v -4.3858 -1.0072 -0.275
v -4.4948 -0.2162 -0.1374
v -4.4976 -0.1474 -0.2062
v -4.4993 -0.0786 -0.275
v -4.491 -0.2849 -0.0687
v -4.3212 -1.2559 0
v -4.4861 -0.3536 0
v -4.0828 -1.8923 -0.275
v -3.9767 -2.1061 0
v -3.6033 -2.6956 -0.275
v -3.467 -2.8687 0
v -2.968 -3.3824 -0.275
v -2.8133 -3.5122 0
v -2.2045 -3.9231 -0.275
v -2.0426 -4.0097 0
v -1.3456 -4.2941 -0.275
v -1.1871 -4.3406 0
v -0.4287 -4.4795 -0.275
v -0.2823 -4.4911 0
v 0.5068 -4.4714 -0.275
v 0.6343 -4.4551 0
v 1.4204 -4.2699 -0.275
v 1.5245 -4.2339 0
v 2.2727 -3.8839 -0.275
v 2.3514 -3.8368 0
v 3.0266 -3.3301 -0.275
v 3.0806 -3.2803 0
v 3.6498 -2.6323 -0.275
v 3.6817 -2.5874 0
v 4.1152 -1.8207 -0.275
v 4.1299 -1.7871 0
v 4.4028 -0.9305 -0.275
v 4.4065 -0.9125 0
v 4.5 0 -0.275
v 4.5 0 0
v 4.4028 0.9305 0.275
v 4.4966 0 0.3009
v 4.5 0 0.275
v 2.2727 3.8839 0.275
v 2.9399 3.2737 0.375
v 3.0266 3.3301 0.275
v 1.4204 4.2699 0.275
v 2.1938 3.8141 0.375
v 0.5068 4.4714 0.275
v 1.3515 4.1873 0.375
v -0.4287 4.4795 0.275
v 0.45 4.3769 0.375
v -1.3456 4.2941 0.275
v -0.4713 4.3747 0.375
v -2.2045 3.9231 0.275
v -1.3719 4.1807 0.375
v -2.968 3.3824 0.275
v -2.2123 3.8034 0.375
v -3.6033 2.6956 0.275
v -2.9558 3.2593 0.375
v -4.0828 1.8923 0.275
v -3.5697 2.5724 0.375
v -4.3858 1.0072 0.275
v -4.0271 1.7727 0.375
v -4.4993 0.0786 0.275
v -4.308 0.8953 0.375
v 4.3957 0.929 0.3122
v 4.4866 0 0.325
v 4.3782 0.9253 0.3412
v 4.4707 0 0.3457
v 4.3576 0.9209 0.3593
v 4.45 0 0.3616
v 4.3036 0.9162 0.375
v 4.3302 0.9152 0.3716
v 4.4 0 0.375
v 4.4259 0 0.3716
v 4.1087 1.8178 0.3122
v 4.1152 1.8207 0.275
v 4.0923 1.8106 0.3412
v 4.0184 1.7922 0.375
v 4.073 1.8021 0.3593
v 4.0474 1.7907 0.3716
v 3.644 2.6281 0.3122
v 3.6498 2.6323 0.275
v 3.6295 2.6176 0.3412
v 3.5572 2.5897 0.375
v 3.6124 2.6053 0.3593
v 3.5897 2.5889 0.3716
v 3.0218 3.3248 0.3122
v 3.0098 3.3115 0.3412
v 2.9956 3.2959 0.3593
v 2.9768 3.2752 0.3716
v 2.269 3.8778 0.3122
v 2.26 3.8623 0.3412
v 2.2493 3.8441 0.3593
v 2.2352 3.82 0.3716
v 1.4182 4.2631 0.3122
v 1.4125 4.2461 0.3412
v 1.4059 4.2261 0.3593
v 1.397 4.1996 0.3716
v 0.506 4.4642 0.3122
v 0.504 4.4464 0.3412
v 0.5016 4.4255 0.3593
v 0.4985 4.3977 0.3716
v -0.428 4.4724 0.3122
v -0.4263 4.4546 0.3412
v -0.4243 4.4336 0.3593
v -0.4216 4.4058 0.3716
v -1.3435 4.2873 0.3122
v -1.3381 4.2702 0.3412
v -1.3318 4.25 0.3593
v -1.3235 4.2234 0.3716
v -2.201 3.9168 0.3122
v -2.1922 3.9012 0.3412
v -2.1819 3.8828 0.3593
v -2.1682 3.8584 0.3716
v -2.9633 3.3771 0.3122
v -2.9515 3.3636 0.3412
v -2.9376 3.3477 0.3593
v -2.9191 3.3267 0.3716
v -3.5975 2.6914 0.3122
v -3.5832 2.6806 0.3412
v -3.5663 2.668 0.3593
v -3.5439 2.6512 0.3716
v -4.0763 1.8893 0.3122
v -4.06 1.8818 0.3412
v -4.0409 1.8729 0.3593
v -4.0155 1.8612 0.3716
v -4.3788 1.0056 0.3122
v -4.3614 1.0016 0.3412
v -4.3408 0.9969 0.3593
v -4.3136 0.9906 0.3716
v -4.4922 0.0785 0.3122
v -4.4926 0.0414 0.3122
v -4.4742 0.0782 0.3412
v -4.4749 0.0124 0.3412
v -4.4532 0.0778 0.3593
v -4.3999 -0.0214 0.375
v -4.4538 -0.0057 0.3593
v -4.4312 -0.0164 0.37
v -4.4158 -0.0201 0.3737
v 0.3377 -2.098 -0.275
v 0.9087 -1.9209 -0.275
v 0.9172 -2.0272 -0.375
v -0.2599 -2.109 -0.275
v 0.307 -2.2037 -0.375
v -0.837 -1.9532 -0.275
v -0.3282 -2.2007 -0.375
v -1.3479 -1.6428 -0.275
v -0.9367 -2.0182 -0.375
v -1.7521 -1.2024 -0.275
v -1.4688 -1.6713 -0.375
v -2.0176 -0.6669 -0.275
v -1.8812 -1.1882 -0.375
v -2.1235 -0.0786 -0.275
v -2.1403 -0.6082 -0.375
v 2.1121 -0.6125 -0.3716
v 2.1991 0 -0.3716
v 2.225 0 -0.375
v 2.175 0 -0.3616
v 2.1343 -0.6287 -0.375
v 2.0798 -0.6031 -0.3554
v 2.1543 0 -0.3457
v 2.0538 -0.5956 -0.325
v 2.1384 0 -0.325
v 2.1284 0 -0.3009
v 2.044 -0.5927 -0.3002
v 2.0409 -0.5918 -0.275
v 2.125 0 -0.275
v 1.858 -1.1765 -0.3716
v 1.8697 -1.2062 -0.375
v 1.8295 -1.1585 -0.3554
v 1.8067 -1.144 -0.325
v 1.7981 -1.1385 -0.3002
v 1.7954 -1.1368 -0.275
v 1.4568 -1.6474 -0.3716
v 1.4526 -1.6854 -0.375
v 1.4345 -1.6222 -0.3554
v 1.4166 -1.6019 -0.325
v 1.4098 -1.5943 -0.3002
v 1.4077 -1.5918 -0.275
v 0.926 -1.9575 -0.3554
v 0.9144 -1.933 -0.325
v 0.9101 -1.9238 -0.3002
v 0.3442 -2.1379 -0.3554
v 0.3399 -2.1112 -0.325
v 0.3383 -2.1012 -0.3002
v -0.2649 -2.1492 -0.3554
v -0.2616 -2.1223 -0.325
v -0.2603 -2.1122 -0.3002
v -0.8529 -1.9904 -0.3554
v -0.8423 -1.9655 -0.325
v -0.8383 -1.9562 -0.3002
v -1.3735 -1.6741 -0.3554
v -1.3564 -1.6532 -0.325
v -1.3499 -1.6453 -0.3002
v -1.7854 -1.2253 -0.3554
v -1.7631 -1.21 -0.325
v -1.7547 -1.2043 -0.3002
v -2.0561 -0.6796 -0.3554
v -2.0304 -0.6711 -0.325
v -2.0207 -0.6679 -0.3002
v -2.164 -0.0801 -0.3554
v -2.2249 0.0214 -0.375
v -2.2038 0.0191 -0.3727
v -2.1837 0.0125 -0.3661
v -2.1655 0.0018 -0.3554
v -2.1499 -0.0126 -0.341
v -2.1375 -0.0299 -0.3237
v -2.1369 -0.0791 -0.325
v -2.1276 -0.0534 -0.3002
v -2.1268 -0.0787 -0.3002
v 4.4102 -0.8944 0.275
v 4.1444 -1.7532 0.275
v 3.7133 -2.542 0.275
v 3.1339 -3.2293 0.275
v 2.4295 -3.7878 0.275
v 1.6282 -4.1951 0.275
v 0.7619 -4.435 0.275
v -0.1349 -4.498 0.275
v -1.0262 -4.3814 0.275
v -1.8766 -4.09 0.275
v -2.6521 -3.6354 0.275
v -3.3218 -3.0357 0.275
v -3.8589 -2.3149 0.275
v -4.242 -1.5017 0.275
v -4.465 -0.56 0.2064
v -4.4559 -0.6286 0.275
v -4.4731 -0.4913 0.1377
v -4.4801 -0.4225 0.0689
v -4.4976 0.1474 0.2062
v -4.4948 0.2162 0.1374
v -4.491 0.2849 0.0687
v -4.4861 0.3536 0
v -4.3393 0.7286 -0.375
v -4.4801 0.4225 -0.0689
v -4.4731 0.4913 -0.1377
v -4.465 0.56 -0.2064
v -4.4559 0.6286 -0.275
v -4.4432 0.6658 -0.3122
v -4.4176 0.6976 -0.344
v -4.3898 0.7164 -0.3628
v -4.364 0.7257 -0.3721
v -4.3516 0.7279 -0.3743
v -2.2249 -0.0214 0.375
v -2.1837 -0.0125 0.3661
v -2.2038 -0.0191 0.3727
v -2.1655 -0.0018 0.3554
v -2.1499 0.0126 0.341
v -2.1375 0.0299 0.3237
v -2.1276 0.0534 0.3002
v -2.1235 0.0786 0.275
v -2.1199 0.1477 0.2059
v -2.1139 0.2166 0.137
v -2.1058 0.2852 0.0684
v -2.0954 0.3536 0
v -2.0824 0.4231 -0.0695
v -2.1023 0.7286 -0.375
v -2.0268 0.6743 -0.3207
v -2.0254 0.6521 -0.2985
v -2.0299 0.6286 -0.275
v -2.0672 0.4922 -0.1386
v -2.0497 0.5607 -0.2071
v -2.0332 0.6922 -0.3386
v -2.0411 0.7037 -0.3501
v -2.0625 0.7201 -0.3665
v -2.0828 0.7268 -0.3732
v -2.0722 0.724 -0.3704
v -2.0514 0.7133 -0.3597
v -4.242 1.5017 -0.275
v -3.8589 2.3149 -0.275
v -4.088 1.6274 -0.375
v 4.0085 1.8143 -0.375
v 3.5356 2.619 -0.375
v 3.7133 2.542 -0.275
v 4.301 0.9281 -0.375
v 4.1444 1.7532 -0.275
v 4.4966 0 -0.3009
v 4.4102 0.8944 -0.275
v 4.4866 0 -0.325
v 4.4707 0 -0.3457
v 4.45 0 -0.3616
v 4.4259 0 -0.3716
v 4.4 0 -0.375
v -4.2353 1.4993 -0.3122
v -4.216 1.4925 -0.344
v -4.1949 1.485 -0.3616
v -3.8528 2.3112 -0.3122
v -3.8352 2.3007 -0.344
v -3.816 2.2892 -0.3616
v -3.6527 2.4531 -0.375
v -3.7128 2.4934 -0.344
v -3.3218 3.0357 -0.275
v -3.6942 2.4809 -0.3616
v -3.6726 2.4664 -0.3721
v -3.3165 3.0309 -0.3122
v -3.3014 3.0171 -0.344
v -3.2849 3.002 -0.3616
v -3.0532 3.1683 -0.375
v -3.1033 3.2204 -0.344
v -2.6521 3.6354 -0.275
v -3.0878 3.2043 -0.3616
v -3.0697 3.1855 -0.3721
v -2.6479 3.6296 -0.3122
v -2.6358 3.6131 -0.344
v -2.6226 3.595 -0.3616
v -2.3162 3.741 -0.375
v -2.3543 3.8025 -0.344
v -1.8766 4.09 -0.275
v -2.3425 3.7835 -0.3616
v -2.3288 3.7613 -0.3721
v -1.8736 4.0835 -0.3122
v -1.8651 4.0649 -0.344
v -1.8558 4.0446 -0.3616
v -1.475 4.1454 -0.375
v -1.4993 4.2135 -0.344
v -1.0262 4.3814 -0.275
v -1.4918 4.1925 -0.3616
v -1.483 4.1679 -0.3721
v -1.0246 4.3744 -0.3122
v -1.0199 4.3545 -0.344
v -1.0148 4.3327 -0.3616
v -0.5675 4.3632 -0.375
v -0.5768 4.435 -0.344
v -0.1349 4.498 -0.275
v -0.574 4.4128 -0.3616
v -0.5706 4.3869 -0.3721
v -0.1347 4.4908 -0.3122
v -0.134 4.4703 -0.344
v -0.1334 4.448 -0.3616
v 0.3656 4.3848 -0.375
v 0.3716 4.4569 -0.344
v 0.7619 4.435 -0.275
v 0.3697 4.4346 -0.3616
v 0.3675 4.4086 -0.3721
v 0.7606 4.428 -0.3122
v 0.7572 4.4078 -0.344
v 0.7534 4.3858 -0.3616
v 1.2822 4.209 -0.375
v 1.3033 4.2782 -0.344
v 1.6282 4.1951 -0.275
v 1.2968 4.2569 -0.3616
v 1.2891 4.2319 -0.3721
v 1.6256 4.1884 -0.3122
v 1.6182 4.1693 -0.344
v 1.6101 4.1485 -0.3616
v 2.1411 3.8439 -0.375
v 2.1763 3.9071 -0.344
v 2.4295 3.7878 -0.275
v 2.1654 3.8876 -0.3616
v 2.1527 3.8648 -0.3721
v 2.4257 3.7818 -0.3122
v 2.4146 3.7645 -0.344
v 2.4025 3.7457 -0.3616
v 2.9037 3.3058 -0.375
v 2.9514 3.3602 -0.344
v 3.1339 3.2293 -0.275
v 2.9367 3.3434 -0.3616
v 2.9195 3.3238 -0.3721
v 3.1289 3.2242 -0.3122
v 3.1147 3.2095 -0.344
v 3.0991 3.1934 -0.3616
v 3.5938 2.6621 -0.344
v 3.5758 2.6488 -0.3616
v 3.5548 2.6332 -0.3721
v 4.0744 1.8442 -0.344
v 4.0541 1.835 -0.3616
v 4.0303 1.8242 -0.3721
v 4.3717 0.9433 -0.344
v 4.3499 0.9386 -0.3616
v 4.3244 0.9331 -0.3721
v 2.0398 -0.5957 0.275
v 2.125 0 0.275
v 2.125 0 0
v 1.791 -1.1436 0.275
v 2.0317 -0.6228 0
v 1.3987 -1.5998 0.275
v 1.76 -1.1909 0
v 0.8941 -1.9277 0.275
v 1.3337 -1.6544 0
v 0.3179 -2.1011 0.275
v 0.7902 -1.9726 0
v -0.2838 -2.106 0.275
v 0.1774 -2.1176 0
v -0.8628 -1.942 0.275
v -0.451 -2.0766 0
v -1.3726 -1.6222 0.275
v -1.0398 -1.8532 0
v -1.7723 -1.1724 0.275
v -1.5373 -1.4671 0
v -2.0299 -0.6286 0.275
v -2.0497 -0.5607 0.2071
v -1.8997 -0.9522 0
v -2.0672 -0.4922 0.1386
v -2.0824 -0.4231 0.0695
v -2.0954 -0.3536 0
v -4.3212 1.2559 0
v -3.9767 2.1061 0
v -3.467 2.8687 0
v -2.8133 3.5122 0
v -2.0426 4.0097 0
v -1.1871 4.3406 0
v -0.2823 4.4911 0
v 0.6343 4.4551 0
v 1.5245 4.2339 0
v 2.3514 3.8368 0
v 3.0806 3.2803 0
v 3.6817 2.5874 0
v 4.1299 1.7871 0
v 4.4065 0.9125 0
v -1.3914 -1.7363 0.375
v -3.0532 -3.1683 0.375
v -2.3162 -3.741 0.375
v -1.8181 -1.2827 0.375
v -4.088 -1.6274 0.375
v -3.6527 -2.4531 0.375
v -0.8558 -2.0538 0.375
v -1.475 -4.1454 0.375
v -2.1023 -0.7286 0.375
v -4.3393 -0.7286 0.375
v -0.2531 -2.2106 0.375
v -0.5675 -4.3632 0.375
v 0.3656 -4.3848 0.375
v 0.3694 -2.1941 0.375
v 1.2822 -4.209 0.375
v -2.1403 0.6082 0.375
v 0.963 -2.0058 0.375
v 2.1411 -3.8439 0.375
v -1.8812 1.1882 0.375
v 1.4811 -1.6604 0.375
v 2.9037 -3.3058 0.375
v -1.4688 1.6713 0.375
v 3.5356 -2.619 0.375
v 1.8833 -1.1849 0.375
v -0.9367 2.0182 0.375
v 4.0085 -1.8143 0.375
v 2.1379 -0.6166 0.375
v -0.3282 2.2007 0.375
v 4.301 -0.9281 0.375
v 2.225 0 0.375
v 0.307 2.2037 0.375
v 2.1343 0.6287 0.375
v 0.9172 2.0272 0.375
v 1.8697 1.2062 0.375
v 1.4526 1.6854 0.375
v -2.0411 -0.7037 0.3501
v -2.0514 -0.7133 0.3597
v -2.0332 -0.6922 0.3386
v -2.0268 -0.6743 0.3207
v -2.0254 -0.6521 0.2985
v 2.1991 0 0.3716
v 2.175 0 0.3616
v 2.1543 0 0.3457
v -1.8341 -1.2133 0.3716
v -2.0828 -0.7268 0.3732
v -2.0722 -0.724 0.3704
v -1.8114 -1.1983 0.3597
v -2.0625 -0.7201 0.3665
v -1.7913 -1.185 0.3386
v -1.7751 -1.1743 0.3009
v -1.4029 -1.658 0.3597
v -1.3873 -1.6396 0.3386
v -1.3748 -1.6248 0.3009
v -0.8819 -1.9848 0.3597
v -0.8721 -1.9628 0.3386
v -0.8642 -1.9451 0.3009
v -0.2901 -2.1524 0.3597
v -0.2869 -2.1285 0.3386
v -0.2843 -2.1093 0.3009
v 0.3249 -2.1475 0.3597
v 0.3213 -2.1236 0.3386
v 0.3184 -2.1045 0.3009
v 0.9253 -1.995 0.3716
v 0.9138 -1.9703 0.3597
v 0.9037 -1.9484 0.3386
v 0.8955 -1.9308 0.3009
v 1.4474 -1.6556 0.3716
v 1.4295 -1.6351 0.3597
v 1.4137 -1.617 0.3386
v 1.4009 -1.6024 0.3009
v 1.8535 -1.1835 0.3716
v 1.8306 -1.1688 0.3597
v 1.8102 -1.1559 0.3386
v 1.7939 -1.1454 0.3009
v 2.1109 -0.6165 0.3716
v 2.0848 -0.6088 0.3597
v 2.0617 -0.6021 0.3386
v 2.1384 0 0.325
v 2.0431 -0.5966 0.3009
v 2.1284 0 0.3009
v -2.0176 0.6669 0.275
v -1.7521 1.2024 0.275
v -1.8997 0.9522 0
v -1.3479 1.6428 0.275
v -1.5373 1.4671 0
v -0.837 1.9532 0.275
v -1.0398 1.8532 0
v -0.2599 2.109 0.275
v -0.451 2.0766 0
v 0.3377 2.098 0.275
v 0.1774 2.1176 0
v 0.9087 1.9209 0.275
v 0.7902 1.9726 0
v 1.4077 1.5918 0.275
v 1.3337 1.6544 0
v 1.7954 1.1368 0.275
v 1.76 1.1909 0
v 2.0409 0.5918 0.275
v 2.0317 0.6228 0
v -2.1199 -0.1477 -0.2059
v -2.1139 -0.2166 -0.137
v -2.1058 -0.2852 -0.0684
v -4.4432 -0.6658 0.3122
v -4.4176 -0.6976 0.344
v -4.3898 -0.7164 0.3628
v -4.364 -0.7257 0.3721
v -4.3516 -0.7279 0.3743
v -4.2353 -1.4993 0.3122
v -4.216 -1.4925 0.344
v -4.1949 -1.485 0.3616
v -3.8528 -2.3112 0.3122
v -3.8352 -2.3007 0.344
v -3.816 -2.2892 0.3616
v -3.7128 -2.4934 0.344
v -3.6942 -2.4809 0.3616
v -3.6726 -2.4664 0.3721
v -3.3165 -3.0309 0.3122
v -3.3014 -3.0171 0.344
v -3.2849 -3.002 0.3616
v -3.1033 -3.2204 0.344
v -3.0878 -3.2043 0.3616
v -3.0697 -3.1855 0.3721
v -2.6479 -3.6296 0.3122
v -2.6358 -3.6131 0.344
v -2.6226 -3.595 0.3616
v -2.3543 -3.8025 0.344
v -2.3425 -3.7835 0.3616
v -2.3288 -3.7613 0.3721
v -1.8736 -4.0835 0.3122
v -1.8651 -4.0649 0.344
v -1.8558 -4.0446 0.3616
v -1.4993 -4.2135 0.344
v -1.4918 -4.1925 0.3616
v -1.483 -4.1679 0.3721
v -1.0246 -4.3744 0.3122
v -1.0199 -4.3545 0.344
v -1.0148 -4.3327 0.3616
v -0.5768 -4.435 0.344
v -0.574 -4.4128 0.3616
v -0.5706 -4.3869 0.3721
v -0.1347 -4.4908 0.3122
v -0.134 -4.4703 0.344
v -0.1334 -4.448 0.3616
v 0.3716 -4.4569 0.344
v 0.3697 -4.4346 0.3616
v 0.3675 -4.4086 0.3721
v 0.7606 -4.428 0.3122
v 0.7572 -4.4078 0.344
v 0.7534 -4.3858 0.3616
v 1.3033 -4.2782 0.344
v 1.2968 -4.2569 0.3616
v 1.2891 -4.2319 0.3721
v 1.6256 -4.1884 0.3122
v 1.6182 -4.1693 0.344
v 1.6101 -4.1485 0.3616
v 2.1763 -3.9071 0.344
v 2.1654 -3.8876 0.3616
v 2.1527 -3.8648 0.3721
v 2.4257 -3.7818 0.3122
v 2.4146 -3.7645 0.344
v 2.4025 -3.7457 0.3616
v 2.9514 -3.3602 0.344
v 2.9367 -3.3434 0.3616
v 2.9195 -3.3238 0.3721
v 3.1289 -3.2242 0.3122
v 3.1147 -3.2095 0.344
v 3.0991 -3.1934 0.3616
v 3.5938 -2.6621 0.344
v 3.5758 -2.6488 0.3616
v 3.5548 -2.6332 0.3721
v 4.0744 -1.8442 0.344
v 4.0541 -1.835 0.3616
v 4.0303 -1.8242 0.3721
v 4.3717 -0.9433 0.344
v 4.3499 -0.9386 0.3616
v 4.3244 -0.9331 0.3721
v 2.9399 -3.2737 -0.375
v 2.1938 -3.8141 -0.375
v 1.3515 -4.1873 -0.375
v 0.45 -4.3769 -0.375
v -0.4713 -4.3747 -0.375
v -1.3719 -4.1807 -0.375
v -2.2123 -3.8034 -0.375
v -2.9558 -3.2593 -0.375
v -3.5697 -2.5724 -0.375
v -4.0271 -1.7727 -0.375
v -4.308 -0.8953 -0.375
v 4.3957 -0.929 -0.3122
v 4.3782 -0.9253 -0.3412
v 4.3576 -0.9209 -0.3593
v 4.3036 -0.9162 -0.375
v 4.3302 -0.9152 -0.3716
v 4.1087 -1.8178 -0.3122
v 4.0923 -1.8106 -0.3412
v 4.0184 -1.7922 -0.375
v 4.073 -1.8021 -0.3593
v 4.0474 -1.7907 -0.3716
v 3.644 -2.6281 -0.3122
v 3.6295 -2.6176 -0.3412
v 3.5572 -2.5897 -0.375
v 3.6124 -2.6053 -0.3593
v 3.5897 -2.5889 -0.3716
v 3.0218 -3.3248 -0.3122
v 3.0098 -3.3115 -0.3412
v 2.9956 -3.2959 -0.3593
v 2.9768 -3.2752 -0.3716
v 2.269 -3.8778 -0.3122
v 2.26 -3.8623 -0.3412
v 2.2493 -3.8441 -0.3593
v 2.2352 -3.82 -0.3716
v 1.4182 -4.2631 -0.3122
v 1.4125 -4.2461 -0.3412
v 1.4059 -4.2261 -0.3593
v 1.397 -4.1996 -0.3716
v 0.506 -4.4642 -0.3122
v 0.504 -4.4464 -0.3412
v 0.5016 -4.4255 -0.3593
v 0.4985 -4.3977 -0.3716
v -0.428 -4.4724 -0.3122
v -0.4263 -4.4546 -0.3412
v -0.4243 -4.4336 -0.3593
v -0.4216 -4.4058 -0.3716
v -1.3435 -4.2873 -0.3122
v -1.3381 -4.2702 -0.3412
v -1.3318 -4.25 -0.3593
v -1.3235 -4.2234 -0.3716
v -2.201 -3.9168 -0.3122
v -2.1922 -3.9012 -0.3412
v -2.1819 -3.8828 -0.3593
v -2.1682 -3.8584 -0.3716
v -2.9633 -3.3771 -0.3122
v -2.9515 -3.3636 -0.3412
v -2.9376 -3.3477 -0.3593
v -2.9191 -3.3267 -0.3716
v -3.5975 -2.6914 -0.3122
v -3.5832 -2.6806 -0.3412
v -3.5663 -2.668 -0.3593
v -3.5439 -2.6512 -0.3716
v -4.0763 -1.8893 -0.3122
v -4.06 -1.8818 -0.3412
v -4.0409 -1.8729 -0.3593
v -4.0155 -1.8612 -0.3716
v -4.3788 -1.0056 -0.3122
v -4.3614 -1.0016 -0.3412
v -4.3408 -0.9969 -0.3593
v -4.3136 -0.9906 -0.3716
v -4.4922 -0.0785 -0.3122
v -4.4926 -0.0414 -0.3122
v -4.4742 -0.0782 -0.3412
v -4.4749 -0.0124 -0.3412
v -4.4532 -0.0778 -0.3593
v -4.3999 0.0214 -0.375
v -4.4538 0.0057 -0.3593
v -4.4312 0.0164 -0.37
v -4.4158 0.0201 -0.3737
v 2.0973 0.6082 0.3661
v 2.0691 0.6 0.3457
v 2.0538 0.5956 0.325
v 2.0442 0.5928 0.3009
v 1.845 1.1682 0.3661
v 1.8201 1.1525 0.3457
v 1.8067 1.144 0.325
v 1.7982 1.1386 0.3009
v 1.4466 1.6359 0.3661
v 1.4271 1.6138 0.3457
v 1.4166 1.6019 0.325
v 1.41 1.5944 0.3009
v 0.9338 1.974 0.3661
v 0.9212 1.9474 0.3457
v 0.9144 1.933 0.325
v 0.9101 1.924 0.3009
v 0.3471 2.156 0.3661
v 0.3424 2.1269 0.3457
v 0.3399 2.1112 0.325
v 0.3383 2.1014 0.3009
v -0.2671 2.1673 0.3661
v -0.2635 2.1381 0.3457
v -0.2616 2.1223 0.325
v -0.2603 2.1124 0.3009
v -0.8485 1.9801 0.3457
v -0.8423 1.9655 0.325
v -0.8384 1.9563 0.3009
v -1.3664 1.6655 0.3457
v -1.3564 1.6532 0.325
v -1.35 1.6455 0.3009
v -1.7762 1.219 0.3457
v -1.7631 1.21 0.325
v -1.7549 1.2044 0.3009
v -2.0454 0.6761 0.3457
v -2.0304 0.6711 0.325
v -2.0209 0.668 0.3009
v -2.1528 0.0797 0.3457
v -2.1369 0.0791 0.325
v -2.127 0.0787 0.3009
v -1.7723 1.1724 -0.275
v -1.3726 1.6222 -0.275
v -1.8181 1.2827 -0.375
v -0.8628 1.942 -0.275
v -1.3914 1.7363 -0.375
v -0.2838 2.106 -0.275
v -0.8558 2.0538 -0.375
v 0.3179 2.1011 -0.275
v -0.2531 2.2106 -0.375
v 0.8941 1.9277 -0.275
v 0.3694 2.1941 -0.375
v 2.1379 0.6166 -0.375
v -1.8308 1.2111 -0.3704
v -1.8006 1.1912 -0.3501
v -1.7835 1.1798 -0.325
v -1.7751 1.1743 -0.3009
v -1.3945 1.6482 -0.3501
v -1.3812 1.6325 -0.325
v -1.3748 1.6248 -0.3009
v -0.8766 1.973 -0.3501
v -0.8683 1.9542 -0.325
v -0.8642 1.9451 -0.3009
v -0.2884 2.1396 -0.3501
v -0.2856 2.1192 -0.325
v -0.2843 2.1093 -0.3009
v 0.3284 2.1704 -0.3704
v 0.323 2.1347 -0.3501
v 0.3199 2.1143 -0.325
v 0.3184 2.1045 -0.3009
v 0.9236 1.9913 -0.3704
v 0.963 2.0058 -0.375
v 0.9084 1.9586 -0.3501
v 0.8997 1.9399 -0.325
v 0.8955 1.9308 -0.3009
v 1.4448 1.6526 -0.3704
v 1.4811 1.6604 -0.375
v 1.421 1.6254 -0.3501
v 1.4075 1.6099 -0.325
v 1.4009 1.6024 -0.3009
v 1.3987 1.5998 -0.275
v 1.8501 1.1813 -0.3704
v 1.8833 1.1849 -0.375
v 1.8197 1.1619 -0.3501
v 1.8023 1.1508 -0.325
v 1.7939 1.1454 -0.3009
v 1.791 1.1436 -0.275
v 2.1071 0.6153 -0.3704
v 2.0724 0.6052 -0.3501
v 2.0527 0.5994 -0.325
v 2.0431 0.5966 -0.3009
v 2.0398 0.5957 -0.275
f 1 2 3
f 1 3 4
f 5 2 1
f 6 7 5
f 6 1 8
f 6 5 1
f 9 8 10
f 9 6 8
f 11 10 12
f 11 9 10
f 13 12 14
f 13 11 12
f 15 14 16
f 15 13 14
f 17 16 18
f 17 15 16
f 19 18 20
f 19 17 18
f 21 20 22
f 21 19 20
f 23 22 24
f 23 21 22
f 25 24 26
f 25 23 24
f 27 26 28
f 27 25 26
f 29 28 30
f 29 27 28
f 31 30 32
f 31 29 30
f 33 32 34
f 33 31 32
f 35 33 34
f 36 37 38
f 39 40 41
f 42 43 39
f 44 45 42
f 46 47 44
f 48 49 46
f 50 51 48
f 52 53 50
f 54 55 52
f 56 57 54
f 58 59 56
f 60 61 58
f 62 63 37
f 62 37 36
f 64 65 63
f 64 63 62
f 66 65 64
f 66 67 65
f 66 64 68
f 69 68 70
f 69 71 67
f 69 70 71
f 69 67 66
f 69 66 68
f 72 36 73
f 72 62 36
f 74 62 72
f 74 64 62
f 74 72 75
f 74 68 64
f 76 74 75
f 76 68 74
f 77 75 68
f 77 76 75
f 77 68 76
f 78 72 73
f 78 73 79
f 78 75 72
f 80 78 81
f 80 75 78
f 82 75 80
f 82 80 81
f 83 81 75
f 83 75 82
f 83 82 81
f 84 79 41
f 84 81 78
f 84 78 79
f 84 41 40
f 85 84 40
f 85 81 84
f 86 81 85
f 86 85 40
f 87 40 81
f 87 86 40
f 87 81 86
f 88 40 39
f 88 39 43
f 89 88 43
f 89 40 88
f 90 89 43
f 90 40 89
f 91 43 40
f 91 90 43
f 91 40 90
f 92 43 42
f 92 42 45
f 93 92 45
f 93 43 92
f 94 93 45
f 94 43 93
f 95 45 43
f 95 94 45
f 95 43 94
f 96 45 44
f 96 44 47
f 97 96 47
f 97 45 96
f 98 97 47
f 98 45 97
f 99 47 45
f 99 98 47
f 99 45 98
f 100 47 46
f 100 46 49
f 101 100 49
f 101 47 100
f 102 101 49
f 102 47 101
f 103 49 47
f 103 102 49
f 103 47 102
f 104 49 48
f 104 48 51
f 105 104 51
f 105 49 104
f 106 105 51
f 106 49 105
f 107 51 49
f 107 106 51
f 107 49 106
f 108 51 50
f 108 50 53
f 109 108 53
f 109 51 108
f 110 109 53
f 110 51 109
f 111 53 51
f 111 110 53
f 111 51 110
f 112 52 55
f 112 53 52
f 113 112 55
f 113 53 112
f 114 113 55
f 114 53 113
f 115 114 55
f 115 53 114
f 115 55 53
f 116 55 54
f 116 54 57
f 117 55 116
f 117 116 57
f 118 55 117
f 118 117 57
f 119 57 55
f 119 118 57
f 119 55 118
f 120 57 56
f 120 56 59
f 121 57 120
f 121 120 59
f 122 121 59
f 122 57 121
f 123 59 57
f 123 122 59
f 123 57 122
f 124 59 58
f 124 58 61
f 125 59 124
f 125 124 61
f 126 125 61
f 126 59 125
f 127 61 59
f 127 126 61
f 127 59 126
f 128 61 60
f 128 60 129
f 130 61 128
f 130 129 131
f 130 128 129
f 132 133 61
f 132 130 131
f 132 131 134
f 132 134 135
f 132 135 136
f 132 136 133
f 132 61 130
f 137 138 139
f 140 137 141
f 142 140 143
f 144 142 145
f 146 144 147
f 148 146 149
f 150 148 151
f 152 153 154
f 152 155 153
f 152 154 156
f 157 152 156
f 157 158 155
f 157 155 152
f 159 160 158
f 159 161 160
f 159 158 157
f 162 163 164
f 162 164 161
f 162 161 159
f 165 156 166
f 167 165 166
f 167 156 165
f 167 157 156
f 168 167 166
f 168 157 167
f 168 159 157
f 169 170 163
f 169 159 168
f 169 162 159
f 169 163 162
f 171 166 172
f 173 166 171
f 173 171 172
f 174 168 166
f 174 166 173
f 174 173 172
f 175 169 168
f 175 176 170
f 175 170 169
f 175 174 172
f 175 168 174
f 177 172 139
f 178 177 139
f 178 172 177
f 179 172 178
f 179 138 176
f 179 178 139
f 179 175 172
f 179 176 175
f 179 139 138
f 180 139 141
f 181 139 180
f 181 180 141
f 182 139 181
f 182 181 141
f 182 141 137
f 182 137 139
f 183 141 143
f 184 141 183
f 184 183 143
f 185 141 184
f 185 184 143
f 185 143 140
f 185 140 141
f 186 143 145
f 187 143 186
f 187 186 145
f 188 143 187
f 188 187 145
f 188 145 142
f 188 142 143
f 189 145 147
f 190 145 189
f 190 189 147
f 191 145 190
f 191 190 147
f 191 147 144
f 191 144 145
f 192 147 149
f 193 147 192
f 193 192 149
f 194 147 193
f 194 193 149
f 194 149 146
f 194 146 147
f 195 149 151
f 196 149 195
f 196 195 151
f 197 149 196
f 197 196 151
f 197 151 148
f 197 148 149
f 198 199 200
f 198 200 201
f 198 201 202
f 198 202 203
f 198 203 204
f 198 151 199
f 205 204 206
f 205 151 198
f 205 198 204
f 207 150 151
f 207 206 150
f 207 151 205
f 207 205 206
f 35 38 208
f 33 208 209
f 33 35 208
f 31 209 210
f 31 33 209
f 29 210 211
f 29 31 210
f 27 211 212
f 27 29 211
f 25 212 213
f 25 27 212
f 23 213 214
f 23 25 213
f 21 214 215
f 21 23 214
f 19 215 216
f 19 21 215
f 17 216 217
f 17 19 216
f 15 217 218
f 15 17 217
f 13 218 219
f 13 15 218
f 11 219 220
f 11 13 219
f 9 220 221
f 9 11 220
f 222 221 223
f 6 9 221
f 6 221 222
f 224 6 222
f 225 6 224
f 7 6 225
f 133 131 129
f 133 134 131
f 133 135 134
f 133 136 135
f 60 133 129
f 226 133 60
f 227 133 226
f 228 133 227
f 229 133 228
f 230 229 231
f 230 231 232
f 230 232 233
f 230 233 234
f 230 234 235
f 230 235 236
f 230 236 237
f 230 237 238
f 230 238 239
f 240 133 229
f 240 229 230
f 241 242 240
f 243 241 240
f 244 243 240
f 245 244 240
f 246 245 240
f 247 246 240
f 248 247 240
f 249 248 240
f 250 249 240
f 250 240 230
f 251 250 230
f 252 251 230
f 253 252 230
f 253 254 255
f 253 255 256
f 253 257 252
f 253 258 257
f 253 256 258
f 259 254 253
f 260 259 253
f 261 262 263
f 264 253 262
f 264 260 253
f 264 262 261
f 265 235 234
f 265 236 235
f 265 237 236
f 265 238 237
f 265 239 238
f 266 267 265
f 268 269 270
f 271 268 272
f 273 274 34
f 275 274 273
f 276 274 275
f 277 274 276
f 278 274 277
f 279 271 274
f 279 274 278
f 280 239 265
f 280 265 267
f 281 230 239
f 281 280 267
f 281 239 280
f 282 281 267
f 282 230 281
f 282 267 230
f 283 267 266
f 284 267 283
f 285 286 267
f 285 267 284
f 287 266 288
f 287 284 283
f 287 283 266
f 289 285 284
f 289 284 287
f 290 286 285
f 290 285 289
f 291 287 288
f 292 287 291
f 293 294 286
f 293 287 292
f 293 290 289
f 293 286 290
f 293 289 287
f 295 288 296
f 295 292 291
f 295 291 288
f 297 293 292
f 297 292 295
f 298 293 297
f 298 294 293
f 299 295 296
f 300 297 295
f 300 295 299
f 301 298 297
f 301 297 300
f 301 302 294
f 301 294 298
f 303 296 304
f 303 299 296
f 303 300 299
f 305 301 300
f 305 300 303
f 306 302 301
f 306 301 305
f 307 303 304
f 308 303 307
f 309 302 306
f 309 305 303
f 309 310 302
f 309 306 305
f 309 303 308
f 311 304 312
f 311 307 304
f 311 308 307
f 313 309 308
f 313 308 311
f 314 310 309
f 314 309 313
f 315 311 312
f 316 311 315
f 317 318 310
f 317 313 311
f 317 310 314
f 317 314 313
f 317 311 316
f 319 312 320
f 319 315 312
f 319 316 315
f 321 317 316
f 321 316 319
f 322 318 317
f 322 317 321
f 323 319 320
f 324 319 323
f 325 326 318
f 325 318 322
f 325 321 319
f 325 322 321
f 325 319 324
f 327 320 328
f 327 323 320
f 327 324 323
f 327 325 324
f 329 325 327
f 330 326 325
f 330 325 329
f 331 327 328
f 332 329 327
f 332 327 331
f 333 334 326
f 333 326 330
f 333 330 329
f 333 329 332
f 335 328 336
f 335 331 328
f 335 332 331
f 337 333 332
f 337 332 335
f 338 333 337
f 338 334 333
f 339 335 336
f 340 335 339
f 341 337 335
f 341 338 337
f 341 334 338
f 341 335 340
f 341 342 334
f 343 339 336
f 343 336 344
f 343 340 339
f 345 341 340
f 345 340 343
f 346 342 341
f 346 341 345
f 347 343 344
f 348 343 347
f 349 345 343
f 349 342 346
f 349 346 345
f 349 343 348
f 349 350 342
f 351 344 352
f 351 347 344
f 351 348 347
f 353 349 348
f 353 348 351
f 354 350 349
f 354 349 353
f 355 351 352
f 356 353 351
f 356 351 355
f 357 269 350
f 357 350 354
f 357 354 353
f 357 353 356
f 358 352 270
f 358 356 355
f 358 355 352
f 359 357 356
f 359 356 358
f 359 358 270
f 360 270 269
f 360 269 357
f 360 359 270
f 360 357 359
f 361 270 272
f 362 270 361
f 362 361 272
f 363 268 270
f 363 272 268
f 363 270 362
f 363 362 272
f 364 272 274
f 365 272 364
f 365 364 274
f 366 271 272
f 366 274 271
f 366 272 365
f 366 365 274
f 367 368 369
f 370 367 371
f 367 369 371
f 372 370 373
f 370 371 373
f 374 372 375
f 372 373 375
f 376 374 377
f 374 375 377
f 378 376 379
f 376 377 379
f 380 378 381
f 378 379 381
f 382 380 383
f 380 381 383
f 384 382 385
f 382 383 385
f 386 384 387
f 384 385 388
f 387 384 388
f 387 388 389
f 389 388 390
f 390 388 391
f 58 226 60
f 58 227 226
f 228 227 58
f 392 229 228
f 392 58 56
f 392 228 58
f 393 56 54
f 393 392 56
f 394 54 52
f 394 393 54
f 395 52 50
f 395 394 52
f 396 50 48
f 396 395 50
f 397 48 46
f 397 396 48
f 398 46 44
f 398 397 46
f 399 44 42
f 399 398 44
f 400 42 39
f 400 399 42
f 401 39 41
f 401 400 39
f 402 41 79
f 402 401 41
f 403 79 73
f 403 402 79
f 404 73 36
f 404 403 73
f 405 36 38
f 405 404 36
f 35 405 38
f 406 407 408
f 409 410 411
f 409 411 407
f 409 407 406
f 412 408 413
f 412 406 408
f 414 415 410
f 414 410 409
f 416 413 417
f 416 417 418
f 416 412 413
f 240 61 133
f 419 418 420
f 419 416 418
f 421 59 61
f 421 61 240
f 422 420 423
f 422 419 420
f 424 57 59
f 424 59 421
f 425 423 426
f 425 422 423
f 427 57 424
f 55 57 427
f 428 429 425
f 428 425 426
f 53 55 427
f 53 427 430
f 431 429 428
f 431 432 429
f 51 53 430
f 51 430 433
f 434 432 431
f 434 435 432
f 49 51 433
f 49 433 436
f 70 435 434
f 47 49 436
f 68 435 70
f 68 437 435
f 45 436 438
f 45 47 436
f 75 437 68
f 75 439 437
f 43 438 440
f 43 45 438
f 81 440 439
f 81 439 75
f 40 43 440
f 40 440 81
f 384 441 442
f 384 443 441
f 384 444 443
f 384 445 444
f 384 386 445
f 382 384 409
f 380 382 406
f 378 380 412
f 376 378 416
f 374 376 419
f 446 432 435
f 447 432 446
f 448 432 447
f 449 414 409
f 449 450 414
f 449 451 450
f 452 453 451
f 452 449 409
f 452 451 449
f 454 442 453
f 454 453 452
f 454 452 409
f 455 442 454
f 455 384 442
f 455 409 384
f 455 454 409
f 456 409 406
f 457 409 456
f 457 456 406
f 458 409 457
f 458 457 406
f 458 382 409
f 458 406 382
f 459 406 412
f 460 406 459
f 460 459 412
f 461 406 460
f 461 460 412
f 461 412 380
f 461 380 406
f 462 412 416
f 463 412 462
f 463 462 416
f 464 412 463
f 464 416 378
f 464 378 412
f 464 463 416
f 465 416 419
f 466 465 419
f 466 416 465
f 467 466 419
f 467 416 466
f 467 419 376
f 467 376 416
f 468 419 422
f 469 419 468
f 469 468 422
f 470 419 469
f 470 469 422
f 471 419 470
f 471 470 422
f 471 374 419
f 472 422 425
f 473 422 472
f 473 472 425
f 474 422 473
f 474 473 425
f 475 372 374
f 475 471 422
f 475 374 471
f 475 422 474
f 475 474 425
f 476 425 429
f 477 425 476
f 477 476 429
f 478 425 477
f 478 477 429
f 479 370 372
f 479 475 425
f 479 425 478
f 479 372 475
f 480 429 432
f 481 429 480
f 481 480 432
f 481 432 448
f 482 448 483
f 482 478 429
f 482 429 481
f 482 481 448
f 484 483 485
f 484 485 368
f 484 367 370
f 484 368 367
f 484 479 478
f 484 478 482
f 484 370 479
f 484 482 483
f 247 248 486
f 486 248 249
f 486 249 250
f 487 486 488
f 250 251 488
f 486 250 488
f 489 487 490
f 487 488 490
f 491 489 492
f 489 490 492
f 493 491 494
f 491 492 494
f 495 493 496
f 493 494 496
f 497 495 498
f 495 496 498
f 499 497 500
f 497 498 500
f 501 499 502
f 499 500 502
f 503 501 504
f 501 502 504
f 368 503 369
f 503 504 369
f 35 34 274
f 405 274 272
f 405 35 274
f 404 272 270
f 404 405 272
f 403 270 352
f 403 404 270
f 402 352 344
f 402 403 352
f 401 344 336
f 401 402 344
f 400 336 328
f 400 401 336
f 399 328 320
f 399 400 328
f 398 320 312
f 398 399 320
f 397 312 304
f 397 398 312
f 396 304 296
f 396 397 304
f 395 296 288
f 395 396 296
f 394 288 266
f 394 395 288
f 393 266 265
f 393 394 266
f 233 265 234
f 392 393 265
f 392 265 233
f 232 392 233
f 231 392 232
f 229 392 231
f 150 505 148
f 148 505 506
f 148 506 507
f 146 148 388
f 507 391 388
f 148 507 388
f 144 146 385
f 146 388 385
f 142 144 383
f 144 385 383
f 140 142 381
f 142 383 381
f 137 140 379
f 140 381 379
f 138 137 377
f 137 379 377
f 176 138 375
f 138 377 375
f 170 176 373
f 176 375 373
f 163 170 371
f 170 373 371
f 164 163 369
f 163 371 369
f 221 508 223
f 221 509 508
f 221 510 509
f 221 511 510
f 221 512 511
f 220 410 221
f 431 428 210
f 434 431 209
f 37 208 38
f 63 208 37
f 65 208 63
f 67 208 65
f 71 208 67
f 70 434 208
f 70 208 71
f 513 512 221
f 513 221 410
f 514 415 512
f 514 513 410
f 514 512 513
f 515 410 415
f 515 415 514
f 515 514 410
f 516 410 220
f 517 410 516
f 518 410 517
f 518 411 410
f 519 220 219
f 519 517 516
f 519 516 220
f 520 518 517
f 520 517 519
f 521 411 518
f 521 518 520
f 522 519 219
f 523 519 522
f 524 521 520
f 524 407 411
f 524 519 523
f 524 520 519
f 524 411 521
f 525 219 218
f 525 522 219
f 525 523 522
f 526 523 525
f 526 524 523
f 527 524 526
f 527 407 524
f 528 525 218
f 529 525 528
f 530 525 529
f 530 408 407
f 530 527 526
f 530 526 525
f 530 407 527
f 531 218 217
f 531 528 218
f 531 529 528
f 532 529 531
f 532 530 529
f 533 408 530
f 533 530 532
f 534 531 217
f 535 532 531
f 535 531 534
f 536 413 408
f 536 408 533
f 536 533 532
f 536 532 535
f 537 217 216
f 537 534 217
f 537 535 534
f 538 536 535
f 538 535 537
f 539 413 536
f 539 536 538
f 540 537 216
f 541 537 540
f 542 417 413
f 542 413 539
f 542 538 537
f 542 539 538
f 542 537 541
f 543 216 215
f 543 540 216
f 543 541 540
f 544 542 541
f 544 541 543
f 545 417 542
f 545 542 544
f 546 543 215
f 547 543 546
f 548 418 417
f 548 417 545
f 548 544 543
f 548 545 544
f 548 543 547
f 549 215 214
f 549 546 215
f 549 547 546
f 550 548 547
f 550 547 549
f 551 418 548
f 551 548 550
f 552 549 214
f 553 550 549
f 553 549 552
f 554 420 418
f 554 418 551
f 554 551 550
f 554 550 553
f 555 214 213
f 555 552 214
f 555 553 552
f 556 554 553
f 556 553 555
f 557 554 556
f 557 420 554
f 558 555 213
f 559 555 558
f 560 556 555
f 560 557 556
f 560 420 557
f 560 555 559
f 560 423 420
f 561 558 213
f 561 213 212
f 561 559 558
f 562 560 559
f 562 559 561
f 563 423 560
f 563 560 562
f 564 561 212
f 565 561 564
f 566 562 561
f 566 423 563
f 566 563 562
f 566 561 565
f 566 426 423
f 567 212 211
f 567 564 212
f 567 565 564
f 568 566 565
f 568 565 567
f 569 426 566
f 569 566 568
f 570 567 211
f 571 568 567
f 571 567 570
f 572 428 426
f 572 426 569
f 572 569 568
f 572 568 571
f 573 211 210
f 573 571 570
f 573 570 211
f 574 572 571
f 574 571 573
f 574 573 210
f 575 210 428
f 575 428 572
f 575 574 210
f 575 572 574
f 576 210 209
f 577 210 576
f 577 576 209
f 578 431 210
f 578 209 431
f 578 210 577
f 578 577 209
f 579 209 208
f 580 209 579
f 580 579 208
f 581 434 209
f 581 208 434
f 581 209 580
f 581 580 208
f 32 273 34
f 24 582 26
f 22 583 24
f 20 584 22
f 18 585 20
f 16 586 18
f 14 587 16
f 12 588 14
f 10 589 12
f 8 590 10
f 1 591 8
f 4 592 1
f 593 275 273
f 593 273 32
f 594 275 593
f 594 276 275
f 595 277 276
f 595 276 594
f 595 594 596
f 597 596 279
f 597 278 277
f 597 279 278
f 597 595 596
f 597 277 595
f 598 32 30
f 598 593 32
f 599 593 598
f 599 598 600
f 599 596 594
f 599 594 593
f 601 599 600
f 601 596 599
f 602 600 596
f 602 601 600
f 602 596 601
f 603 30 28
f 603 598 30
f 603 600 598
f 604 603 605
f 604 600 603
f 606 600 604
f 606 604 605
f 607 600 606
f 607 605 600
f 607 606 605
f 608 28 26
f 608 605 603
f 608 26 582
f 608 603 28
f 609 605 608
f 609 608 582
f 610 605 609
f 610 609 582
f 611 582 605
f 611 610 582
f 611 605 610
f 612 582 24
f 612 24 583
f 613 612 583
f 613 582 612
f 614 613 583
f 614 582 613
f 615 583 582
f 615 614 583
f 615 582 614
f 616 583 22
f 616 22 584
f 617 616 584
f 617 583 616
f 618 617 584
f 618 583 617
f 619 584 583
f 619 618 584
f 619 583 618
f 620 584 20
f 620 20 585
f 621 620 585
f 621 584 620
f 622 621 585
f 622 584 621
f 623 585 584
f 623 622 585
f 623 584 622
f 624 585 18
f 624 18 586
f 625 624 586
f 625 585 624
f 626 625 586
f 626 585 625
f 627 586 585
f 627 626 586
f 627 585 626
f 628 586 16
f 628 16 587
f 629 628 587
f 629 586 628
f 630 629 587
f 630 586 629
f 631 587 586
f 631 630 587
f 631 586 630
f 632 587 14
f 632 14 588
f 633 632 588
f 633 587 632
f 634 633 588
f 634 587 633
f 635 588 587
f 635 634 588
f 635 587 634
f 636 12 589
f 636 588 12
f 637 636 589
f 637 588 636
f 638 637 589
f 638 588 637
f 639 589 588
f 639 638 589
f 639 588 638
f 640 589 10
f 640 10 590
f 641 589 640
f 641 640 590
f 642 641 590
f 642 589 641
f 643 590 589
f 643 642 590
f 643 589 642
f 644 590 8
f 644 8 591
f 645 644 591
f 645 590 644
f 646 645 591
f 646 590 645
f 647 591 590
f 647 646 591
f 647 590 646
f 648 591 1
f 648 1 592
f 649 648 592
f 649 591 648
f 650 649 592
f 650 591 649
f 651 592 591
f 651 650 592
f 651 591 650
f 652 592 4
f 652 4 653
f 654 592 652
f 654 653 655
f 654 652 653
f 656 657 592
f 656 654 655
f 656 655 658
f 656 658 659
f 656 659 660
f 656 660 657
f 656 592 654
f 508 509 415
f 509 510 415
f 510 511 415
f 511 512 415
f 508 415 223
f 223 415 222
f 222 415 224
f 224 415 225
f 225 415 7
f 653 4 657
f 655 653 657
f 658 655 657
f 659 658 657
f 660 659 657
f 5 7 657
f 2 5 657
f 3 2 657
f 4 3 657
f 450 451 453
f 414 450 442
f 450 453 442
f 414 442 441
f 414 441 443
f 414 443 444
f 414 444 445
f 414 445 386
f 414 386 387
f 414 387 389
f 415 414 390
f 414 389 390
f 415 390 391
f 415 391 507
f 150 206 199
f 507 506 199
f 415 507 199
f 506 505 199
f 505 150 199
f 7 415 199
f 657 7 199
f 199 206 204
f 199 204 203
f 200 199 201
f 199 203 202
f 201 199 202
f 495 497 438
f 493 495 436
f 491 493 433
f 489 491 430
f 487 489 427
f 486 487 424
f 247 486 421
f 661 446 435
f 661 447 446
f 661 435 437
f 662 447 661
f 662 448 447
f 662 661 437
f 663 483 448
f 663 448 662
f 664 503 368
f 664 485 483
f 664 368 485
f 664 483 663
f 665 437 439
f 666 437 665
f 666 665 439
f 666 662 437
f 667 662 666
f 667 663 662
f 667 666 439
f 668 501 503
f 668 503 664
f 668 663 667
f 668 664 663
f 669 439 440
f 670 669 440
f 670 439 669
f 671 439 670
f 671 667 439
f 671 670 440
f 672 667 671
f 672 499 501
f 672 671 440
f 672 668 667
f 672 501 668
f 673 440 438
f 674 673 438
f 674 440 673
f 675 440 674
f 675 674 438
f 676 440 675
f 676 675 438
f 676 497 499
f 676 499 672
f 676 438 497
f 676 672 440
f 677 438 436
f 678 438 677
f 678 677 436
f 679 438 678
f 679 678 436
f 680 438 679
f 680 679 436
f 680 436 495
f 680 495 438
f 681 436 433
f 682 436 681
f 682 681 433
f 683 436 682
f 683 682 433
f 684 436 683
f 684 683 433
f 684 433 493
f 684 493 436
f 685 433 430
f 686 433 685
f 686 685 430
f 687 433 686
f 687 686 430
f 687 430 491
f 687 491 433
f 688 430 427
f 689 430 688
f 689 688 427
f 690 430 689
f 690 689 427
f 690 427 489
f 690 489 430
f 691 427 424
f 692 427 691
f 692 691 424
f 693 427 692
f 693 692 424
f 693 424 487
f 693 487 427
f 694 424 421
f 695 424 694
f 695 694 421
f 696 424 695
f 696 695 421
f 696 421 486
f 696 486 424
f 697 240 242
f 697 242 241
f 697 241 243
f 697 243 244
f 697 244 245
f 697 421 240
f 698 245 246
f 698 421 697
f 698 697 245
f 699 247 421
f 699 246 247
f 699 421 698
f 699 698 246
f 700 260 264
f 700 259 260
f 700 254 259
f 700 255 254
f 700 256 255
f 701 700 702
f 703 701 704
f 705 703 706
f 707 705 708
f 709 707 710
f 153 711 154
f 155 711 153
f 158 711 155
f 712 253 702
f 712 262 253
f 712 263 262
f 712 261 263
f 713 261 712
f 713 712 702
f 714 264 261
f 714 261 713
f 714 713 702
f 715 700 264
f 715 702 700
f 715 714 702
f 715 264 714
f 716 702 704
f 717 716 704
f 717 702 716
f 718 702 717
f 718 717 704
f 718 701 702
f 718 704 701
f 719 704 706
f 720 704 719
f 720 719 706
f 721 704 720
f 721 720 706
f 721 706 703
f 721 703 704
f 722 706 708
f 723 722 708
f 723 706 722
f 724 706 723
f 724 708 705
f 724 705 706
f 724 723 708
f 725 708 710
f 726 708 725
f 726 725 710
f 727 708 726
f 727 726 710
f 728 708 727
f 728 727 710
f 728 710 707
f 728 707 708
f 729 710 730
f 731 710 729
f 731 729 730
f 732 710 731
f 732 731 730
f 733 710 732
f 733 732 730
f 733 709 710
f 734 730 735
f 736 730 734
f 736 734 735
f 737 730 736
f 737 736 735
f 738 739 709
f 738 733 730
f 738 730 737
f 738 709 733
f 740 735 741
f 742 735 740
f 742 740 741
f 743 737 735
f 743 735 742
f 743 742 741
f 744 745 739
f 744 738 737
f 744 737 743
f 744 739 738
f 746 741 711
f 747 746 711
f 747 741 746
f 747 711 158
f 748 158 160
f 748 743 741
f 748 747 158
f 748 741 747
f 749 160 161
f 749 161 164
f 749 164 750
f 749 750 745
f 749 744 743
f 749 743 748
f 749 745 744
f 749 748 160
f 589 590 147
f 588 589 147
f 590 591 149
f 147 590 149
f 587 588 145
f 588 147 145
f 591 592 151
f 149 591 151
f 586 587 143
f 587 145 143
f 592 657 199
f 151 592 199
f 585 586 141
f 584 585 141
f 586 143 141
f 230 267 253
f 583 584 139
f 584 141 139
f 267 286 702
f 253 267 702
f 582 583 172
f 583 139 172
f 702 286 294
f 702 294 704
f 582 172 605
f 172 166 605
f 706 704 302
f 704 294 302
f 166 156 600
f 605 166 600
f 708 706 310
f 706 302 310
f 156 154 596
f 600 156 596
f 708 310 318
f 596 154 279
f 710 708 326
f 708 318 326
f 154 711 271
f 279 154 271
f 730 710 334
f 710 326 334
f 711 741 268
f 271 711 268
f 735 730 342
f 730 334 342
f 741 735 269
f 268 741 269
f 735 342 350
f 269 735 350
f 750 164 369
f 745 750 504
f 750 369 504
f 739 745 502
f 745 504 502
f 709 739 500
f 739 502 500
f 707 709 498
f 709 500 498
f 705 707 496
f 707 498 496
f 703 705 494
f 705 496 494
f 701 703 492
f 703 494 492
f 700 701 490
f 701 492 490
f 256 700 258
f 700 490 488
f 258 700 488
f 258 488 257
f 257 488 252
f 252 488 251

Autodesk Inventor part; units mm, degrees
ref_plane "YZ Plane" through (0, 0, 0) normal (1, 0, 0) x (0, 1, 0)
ref_plane "XZ Plane" through (0, 0, 0) normal (0, 1, 0) x (-1, 0, 0)
ref_plane "XY Plane" through (0, 0, 0) normal (0, 0, 1) x (1, 0, 0)
sketch "Sketch1" plane through (0, 0, 0) normal (0, 0, 1) x (1, 0, 0)
  circle A0 centre (0, 0) radius 4.5
  circle A1 centre (0, 0) radius 2.125
  dimension "d0" = 9
  dimension "d1" = 4.25
extrude "Extrusion1" add sketch "Sketch1" along normal mid plane 0.75
sketch "Sketch2" plane through (0, 0, 0) normal (1, 0, 0) x (0, 1, 0)
  line L0 (-2.125, 0.375) -> (2.125, 0.375) construction
  line L1 (2.125, -0.375) -> (-2.125, -0.375) construction
  line L2 (0, 0) -> (0, 0.375) construction
  line L3 (0, 0) -> (-0.375, 0.375) construction
  line L4 (-0.7286, 0.375) -> (0.0214, -0.375)
  line L5 (-0.0214, 0.375) -> (0.7286, -0.375)
  line L6 (0.0214, -0.375) -> (0.7286, -0.375)
  line L7 (-0.0214, 0.375) -> (-0.7286, 0.375)
  dimension "d5" = 0.5
  dimension "d9" = 45
extrude "Extrusion2" cut sketch "Sketch2" against normal through all
fillet "Fillet1" radius 0.1 8 edges at (-0.0107, 4.5, 0.375) (0.3655, -4.4851, 0.375) (0.3655, 4.4851, -0.375) (-0.0107, -4.5, -0.375) (0.3699, -2.0926, 0.375) (-0.0107, 2.125, 0.375) (-0.0107, -2.125, -0.375) (0.3699, 2.0926, -0.375)
properties part number "Lock Washer -2"
